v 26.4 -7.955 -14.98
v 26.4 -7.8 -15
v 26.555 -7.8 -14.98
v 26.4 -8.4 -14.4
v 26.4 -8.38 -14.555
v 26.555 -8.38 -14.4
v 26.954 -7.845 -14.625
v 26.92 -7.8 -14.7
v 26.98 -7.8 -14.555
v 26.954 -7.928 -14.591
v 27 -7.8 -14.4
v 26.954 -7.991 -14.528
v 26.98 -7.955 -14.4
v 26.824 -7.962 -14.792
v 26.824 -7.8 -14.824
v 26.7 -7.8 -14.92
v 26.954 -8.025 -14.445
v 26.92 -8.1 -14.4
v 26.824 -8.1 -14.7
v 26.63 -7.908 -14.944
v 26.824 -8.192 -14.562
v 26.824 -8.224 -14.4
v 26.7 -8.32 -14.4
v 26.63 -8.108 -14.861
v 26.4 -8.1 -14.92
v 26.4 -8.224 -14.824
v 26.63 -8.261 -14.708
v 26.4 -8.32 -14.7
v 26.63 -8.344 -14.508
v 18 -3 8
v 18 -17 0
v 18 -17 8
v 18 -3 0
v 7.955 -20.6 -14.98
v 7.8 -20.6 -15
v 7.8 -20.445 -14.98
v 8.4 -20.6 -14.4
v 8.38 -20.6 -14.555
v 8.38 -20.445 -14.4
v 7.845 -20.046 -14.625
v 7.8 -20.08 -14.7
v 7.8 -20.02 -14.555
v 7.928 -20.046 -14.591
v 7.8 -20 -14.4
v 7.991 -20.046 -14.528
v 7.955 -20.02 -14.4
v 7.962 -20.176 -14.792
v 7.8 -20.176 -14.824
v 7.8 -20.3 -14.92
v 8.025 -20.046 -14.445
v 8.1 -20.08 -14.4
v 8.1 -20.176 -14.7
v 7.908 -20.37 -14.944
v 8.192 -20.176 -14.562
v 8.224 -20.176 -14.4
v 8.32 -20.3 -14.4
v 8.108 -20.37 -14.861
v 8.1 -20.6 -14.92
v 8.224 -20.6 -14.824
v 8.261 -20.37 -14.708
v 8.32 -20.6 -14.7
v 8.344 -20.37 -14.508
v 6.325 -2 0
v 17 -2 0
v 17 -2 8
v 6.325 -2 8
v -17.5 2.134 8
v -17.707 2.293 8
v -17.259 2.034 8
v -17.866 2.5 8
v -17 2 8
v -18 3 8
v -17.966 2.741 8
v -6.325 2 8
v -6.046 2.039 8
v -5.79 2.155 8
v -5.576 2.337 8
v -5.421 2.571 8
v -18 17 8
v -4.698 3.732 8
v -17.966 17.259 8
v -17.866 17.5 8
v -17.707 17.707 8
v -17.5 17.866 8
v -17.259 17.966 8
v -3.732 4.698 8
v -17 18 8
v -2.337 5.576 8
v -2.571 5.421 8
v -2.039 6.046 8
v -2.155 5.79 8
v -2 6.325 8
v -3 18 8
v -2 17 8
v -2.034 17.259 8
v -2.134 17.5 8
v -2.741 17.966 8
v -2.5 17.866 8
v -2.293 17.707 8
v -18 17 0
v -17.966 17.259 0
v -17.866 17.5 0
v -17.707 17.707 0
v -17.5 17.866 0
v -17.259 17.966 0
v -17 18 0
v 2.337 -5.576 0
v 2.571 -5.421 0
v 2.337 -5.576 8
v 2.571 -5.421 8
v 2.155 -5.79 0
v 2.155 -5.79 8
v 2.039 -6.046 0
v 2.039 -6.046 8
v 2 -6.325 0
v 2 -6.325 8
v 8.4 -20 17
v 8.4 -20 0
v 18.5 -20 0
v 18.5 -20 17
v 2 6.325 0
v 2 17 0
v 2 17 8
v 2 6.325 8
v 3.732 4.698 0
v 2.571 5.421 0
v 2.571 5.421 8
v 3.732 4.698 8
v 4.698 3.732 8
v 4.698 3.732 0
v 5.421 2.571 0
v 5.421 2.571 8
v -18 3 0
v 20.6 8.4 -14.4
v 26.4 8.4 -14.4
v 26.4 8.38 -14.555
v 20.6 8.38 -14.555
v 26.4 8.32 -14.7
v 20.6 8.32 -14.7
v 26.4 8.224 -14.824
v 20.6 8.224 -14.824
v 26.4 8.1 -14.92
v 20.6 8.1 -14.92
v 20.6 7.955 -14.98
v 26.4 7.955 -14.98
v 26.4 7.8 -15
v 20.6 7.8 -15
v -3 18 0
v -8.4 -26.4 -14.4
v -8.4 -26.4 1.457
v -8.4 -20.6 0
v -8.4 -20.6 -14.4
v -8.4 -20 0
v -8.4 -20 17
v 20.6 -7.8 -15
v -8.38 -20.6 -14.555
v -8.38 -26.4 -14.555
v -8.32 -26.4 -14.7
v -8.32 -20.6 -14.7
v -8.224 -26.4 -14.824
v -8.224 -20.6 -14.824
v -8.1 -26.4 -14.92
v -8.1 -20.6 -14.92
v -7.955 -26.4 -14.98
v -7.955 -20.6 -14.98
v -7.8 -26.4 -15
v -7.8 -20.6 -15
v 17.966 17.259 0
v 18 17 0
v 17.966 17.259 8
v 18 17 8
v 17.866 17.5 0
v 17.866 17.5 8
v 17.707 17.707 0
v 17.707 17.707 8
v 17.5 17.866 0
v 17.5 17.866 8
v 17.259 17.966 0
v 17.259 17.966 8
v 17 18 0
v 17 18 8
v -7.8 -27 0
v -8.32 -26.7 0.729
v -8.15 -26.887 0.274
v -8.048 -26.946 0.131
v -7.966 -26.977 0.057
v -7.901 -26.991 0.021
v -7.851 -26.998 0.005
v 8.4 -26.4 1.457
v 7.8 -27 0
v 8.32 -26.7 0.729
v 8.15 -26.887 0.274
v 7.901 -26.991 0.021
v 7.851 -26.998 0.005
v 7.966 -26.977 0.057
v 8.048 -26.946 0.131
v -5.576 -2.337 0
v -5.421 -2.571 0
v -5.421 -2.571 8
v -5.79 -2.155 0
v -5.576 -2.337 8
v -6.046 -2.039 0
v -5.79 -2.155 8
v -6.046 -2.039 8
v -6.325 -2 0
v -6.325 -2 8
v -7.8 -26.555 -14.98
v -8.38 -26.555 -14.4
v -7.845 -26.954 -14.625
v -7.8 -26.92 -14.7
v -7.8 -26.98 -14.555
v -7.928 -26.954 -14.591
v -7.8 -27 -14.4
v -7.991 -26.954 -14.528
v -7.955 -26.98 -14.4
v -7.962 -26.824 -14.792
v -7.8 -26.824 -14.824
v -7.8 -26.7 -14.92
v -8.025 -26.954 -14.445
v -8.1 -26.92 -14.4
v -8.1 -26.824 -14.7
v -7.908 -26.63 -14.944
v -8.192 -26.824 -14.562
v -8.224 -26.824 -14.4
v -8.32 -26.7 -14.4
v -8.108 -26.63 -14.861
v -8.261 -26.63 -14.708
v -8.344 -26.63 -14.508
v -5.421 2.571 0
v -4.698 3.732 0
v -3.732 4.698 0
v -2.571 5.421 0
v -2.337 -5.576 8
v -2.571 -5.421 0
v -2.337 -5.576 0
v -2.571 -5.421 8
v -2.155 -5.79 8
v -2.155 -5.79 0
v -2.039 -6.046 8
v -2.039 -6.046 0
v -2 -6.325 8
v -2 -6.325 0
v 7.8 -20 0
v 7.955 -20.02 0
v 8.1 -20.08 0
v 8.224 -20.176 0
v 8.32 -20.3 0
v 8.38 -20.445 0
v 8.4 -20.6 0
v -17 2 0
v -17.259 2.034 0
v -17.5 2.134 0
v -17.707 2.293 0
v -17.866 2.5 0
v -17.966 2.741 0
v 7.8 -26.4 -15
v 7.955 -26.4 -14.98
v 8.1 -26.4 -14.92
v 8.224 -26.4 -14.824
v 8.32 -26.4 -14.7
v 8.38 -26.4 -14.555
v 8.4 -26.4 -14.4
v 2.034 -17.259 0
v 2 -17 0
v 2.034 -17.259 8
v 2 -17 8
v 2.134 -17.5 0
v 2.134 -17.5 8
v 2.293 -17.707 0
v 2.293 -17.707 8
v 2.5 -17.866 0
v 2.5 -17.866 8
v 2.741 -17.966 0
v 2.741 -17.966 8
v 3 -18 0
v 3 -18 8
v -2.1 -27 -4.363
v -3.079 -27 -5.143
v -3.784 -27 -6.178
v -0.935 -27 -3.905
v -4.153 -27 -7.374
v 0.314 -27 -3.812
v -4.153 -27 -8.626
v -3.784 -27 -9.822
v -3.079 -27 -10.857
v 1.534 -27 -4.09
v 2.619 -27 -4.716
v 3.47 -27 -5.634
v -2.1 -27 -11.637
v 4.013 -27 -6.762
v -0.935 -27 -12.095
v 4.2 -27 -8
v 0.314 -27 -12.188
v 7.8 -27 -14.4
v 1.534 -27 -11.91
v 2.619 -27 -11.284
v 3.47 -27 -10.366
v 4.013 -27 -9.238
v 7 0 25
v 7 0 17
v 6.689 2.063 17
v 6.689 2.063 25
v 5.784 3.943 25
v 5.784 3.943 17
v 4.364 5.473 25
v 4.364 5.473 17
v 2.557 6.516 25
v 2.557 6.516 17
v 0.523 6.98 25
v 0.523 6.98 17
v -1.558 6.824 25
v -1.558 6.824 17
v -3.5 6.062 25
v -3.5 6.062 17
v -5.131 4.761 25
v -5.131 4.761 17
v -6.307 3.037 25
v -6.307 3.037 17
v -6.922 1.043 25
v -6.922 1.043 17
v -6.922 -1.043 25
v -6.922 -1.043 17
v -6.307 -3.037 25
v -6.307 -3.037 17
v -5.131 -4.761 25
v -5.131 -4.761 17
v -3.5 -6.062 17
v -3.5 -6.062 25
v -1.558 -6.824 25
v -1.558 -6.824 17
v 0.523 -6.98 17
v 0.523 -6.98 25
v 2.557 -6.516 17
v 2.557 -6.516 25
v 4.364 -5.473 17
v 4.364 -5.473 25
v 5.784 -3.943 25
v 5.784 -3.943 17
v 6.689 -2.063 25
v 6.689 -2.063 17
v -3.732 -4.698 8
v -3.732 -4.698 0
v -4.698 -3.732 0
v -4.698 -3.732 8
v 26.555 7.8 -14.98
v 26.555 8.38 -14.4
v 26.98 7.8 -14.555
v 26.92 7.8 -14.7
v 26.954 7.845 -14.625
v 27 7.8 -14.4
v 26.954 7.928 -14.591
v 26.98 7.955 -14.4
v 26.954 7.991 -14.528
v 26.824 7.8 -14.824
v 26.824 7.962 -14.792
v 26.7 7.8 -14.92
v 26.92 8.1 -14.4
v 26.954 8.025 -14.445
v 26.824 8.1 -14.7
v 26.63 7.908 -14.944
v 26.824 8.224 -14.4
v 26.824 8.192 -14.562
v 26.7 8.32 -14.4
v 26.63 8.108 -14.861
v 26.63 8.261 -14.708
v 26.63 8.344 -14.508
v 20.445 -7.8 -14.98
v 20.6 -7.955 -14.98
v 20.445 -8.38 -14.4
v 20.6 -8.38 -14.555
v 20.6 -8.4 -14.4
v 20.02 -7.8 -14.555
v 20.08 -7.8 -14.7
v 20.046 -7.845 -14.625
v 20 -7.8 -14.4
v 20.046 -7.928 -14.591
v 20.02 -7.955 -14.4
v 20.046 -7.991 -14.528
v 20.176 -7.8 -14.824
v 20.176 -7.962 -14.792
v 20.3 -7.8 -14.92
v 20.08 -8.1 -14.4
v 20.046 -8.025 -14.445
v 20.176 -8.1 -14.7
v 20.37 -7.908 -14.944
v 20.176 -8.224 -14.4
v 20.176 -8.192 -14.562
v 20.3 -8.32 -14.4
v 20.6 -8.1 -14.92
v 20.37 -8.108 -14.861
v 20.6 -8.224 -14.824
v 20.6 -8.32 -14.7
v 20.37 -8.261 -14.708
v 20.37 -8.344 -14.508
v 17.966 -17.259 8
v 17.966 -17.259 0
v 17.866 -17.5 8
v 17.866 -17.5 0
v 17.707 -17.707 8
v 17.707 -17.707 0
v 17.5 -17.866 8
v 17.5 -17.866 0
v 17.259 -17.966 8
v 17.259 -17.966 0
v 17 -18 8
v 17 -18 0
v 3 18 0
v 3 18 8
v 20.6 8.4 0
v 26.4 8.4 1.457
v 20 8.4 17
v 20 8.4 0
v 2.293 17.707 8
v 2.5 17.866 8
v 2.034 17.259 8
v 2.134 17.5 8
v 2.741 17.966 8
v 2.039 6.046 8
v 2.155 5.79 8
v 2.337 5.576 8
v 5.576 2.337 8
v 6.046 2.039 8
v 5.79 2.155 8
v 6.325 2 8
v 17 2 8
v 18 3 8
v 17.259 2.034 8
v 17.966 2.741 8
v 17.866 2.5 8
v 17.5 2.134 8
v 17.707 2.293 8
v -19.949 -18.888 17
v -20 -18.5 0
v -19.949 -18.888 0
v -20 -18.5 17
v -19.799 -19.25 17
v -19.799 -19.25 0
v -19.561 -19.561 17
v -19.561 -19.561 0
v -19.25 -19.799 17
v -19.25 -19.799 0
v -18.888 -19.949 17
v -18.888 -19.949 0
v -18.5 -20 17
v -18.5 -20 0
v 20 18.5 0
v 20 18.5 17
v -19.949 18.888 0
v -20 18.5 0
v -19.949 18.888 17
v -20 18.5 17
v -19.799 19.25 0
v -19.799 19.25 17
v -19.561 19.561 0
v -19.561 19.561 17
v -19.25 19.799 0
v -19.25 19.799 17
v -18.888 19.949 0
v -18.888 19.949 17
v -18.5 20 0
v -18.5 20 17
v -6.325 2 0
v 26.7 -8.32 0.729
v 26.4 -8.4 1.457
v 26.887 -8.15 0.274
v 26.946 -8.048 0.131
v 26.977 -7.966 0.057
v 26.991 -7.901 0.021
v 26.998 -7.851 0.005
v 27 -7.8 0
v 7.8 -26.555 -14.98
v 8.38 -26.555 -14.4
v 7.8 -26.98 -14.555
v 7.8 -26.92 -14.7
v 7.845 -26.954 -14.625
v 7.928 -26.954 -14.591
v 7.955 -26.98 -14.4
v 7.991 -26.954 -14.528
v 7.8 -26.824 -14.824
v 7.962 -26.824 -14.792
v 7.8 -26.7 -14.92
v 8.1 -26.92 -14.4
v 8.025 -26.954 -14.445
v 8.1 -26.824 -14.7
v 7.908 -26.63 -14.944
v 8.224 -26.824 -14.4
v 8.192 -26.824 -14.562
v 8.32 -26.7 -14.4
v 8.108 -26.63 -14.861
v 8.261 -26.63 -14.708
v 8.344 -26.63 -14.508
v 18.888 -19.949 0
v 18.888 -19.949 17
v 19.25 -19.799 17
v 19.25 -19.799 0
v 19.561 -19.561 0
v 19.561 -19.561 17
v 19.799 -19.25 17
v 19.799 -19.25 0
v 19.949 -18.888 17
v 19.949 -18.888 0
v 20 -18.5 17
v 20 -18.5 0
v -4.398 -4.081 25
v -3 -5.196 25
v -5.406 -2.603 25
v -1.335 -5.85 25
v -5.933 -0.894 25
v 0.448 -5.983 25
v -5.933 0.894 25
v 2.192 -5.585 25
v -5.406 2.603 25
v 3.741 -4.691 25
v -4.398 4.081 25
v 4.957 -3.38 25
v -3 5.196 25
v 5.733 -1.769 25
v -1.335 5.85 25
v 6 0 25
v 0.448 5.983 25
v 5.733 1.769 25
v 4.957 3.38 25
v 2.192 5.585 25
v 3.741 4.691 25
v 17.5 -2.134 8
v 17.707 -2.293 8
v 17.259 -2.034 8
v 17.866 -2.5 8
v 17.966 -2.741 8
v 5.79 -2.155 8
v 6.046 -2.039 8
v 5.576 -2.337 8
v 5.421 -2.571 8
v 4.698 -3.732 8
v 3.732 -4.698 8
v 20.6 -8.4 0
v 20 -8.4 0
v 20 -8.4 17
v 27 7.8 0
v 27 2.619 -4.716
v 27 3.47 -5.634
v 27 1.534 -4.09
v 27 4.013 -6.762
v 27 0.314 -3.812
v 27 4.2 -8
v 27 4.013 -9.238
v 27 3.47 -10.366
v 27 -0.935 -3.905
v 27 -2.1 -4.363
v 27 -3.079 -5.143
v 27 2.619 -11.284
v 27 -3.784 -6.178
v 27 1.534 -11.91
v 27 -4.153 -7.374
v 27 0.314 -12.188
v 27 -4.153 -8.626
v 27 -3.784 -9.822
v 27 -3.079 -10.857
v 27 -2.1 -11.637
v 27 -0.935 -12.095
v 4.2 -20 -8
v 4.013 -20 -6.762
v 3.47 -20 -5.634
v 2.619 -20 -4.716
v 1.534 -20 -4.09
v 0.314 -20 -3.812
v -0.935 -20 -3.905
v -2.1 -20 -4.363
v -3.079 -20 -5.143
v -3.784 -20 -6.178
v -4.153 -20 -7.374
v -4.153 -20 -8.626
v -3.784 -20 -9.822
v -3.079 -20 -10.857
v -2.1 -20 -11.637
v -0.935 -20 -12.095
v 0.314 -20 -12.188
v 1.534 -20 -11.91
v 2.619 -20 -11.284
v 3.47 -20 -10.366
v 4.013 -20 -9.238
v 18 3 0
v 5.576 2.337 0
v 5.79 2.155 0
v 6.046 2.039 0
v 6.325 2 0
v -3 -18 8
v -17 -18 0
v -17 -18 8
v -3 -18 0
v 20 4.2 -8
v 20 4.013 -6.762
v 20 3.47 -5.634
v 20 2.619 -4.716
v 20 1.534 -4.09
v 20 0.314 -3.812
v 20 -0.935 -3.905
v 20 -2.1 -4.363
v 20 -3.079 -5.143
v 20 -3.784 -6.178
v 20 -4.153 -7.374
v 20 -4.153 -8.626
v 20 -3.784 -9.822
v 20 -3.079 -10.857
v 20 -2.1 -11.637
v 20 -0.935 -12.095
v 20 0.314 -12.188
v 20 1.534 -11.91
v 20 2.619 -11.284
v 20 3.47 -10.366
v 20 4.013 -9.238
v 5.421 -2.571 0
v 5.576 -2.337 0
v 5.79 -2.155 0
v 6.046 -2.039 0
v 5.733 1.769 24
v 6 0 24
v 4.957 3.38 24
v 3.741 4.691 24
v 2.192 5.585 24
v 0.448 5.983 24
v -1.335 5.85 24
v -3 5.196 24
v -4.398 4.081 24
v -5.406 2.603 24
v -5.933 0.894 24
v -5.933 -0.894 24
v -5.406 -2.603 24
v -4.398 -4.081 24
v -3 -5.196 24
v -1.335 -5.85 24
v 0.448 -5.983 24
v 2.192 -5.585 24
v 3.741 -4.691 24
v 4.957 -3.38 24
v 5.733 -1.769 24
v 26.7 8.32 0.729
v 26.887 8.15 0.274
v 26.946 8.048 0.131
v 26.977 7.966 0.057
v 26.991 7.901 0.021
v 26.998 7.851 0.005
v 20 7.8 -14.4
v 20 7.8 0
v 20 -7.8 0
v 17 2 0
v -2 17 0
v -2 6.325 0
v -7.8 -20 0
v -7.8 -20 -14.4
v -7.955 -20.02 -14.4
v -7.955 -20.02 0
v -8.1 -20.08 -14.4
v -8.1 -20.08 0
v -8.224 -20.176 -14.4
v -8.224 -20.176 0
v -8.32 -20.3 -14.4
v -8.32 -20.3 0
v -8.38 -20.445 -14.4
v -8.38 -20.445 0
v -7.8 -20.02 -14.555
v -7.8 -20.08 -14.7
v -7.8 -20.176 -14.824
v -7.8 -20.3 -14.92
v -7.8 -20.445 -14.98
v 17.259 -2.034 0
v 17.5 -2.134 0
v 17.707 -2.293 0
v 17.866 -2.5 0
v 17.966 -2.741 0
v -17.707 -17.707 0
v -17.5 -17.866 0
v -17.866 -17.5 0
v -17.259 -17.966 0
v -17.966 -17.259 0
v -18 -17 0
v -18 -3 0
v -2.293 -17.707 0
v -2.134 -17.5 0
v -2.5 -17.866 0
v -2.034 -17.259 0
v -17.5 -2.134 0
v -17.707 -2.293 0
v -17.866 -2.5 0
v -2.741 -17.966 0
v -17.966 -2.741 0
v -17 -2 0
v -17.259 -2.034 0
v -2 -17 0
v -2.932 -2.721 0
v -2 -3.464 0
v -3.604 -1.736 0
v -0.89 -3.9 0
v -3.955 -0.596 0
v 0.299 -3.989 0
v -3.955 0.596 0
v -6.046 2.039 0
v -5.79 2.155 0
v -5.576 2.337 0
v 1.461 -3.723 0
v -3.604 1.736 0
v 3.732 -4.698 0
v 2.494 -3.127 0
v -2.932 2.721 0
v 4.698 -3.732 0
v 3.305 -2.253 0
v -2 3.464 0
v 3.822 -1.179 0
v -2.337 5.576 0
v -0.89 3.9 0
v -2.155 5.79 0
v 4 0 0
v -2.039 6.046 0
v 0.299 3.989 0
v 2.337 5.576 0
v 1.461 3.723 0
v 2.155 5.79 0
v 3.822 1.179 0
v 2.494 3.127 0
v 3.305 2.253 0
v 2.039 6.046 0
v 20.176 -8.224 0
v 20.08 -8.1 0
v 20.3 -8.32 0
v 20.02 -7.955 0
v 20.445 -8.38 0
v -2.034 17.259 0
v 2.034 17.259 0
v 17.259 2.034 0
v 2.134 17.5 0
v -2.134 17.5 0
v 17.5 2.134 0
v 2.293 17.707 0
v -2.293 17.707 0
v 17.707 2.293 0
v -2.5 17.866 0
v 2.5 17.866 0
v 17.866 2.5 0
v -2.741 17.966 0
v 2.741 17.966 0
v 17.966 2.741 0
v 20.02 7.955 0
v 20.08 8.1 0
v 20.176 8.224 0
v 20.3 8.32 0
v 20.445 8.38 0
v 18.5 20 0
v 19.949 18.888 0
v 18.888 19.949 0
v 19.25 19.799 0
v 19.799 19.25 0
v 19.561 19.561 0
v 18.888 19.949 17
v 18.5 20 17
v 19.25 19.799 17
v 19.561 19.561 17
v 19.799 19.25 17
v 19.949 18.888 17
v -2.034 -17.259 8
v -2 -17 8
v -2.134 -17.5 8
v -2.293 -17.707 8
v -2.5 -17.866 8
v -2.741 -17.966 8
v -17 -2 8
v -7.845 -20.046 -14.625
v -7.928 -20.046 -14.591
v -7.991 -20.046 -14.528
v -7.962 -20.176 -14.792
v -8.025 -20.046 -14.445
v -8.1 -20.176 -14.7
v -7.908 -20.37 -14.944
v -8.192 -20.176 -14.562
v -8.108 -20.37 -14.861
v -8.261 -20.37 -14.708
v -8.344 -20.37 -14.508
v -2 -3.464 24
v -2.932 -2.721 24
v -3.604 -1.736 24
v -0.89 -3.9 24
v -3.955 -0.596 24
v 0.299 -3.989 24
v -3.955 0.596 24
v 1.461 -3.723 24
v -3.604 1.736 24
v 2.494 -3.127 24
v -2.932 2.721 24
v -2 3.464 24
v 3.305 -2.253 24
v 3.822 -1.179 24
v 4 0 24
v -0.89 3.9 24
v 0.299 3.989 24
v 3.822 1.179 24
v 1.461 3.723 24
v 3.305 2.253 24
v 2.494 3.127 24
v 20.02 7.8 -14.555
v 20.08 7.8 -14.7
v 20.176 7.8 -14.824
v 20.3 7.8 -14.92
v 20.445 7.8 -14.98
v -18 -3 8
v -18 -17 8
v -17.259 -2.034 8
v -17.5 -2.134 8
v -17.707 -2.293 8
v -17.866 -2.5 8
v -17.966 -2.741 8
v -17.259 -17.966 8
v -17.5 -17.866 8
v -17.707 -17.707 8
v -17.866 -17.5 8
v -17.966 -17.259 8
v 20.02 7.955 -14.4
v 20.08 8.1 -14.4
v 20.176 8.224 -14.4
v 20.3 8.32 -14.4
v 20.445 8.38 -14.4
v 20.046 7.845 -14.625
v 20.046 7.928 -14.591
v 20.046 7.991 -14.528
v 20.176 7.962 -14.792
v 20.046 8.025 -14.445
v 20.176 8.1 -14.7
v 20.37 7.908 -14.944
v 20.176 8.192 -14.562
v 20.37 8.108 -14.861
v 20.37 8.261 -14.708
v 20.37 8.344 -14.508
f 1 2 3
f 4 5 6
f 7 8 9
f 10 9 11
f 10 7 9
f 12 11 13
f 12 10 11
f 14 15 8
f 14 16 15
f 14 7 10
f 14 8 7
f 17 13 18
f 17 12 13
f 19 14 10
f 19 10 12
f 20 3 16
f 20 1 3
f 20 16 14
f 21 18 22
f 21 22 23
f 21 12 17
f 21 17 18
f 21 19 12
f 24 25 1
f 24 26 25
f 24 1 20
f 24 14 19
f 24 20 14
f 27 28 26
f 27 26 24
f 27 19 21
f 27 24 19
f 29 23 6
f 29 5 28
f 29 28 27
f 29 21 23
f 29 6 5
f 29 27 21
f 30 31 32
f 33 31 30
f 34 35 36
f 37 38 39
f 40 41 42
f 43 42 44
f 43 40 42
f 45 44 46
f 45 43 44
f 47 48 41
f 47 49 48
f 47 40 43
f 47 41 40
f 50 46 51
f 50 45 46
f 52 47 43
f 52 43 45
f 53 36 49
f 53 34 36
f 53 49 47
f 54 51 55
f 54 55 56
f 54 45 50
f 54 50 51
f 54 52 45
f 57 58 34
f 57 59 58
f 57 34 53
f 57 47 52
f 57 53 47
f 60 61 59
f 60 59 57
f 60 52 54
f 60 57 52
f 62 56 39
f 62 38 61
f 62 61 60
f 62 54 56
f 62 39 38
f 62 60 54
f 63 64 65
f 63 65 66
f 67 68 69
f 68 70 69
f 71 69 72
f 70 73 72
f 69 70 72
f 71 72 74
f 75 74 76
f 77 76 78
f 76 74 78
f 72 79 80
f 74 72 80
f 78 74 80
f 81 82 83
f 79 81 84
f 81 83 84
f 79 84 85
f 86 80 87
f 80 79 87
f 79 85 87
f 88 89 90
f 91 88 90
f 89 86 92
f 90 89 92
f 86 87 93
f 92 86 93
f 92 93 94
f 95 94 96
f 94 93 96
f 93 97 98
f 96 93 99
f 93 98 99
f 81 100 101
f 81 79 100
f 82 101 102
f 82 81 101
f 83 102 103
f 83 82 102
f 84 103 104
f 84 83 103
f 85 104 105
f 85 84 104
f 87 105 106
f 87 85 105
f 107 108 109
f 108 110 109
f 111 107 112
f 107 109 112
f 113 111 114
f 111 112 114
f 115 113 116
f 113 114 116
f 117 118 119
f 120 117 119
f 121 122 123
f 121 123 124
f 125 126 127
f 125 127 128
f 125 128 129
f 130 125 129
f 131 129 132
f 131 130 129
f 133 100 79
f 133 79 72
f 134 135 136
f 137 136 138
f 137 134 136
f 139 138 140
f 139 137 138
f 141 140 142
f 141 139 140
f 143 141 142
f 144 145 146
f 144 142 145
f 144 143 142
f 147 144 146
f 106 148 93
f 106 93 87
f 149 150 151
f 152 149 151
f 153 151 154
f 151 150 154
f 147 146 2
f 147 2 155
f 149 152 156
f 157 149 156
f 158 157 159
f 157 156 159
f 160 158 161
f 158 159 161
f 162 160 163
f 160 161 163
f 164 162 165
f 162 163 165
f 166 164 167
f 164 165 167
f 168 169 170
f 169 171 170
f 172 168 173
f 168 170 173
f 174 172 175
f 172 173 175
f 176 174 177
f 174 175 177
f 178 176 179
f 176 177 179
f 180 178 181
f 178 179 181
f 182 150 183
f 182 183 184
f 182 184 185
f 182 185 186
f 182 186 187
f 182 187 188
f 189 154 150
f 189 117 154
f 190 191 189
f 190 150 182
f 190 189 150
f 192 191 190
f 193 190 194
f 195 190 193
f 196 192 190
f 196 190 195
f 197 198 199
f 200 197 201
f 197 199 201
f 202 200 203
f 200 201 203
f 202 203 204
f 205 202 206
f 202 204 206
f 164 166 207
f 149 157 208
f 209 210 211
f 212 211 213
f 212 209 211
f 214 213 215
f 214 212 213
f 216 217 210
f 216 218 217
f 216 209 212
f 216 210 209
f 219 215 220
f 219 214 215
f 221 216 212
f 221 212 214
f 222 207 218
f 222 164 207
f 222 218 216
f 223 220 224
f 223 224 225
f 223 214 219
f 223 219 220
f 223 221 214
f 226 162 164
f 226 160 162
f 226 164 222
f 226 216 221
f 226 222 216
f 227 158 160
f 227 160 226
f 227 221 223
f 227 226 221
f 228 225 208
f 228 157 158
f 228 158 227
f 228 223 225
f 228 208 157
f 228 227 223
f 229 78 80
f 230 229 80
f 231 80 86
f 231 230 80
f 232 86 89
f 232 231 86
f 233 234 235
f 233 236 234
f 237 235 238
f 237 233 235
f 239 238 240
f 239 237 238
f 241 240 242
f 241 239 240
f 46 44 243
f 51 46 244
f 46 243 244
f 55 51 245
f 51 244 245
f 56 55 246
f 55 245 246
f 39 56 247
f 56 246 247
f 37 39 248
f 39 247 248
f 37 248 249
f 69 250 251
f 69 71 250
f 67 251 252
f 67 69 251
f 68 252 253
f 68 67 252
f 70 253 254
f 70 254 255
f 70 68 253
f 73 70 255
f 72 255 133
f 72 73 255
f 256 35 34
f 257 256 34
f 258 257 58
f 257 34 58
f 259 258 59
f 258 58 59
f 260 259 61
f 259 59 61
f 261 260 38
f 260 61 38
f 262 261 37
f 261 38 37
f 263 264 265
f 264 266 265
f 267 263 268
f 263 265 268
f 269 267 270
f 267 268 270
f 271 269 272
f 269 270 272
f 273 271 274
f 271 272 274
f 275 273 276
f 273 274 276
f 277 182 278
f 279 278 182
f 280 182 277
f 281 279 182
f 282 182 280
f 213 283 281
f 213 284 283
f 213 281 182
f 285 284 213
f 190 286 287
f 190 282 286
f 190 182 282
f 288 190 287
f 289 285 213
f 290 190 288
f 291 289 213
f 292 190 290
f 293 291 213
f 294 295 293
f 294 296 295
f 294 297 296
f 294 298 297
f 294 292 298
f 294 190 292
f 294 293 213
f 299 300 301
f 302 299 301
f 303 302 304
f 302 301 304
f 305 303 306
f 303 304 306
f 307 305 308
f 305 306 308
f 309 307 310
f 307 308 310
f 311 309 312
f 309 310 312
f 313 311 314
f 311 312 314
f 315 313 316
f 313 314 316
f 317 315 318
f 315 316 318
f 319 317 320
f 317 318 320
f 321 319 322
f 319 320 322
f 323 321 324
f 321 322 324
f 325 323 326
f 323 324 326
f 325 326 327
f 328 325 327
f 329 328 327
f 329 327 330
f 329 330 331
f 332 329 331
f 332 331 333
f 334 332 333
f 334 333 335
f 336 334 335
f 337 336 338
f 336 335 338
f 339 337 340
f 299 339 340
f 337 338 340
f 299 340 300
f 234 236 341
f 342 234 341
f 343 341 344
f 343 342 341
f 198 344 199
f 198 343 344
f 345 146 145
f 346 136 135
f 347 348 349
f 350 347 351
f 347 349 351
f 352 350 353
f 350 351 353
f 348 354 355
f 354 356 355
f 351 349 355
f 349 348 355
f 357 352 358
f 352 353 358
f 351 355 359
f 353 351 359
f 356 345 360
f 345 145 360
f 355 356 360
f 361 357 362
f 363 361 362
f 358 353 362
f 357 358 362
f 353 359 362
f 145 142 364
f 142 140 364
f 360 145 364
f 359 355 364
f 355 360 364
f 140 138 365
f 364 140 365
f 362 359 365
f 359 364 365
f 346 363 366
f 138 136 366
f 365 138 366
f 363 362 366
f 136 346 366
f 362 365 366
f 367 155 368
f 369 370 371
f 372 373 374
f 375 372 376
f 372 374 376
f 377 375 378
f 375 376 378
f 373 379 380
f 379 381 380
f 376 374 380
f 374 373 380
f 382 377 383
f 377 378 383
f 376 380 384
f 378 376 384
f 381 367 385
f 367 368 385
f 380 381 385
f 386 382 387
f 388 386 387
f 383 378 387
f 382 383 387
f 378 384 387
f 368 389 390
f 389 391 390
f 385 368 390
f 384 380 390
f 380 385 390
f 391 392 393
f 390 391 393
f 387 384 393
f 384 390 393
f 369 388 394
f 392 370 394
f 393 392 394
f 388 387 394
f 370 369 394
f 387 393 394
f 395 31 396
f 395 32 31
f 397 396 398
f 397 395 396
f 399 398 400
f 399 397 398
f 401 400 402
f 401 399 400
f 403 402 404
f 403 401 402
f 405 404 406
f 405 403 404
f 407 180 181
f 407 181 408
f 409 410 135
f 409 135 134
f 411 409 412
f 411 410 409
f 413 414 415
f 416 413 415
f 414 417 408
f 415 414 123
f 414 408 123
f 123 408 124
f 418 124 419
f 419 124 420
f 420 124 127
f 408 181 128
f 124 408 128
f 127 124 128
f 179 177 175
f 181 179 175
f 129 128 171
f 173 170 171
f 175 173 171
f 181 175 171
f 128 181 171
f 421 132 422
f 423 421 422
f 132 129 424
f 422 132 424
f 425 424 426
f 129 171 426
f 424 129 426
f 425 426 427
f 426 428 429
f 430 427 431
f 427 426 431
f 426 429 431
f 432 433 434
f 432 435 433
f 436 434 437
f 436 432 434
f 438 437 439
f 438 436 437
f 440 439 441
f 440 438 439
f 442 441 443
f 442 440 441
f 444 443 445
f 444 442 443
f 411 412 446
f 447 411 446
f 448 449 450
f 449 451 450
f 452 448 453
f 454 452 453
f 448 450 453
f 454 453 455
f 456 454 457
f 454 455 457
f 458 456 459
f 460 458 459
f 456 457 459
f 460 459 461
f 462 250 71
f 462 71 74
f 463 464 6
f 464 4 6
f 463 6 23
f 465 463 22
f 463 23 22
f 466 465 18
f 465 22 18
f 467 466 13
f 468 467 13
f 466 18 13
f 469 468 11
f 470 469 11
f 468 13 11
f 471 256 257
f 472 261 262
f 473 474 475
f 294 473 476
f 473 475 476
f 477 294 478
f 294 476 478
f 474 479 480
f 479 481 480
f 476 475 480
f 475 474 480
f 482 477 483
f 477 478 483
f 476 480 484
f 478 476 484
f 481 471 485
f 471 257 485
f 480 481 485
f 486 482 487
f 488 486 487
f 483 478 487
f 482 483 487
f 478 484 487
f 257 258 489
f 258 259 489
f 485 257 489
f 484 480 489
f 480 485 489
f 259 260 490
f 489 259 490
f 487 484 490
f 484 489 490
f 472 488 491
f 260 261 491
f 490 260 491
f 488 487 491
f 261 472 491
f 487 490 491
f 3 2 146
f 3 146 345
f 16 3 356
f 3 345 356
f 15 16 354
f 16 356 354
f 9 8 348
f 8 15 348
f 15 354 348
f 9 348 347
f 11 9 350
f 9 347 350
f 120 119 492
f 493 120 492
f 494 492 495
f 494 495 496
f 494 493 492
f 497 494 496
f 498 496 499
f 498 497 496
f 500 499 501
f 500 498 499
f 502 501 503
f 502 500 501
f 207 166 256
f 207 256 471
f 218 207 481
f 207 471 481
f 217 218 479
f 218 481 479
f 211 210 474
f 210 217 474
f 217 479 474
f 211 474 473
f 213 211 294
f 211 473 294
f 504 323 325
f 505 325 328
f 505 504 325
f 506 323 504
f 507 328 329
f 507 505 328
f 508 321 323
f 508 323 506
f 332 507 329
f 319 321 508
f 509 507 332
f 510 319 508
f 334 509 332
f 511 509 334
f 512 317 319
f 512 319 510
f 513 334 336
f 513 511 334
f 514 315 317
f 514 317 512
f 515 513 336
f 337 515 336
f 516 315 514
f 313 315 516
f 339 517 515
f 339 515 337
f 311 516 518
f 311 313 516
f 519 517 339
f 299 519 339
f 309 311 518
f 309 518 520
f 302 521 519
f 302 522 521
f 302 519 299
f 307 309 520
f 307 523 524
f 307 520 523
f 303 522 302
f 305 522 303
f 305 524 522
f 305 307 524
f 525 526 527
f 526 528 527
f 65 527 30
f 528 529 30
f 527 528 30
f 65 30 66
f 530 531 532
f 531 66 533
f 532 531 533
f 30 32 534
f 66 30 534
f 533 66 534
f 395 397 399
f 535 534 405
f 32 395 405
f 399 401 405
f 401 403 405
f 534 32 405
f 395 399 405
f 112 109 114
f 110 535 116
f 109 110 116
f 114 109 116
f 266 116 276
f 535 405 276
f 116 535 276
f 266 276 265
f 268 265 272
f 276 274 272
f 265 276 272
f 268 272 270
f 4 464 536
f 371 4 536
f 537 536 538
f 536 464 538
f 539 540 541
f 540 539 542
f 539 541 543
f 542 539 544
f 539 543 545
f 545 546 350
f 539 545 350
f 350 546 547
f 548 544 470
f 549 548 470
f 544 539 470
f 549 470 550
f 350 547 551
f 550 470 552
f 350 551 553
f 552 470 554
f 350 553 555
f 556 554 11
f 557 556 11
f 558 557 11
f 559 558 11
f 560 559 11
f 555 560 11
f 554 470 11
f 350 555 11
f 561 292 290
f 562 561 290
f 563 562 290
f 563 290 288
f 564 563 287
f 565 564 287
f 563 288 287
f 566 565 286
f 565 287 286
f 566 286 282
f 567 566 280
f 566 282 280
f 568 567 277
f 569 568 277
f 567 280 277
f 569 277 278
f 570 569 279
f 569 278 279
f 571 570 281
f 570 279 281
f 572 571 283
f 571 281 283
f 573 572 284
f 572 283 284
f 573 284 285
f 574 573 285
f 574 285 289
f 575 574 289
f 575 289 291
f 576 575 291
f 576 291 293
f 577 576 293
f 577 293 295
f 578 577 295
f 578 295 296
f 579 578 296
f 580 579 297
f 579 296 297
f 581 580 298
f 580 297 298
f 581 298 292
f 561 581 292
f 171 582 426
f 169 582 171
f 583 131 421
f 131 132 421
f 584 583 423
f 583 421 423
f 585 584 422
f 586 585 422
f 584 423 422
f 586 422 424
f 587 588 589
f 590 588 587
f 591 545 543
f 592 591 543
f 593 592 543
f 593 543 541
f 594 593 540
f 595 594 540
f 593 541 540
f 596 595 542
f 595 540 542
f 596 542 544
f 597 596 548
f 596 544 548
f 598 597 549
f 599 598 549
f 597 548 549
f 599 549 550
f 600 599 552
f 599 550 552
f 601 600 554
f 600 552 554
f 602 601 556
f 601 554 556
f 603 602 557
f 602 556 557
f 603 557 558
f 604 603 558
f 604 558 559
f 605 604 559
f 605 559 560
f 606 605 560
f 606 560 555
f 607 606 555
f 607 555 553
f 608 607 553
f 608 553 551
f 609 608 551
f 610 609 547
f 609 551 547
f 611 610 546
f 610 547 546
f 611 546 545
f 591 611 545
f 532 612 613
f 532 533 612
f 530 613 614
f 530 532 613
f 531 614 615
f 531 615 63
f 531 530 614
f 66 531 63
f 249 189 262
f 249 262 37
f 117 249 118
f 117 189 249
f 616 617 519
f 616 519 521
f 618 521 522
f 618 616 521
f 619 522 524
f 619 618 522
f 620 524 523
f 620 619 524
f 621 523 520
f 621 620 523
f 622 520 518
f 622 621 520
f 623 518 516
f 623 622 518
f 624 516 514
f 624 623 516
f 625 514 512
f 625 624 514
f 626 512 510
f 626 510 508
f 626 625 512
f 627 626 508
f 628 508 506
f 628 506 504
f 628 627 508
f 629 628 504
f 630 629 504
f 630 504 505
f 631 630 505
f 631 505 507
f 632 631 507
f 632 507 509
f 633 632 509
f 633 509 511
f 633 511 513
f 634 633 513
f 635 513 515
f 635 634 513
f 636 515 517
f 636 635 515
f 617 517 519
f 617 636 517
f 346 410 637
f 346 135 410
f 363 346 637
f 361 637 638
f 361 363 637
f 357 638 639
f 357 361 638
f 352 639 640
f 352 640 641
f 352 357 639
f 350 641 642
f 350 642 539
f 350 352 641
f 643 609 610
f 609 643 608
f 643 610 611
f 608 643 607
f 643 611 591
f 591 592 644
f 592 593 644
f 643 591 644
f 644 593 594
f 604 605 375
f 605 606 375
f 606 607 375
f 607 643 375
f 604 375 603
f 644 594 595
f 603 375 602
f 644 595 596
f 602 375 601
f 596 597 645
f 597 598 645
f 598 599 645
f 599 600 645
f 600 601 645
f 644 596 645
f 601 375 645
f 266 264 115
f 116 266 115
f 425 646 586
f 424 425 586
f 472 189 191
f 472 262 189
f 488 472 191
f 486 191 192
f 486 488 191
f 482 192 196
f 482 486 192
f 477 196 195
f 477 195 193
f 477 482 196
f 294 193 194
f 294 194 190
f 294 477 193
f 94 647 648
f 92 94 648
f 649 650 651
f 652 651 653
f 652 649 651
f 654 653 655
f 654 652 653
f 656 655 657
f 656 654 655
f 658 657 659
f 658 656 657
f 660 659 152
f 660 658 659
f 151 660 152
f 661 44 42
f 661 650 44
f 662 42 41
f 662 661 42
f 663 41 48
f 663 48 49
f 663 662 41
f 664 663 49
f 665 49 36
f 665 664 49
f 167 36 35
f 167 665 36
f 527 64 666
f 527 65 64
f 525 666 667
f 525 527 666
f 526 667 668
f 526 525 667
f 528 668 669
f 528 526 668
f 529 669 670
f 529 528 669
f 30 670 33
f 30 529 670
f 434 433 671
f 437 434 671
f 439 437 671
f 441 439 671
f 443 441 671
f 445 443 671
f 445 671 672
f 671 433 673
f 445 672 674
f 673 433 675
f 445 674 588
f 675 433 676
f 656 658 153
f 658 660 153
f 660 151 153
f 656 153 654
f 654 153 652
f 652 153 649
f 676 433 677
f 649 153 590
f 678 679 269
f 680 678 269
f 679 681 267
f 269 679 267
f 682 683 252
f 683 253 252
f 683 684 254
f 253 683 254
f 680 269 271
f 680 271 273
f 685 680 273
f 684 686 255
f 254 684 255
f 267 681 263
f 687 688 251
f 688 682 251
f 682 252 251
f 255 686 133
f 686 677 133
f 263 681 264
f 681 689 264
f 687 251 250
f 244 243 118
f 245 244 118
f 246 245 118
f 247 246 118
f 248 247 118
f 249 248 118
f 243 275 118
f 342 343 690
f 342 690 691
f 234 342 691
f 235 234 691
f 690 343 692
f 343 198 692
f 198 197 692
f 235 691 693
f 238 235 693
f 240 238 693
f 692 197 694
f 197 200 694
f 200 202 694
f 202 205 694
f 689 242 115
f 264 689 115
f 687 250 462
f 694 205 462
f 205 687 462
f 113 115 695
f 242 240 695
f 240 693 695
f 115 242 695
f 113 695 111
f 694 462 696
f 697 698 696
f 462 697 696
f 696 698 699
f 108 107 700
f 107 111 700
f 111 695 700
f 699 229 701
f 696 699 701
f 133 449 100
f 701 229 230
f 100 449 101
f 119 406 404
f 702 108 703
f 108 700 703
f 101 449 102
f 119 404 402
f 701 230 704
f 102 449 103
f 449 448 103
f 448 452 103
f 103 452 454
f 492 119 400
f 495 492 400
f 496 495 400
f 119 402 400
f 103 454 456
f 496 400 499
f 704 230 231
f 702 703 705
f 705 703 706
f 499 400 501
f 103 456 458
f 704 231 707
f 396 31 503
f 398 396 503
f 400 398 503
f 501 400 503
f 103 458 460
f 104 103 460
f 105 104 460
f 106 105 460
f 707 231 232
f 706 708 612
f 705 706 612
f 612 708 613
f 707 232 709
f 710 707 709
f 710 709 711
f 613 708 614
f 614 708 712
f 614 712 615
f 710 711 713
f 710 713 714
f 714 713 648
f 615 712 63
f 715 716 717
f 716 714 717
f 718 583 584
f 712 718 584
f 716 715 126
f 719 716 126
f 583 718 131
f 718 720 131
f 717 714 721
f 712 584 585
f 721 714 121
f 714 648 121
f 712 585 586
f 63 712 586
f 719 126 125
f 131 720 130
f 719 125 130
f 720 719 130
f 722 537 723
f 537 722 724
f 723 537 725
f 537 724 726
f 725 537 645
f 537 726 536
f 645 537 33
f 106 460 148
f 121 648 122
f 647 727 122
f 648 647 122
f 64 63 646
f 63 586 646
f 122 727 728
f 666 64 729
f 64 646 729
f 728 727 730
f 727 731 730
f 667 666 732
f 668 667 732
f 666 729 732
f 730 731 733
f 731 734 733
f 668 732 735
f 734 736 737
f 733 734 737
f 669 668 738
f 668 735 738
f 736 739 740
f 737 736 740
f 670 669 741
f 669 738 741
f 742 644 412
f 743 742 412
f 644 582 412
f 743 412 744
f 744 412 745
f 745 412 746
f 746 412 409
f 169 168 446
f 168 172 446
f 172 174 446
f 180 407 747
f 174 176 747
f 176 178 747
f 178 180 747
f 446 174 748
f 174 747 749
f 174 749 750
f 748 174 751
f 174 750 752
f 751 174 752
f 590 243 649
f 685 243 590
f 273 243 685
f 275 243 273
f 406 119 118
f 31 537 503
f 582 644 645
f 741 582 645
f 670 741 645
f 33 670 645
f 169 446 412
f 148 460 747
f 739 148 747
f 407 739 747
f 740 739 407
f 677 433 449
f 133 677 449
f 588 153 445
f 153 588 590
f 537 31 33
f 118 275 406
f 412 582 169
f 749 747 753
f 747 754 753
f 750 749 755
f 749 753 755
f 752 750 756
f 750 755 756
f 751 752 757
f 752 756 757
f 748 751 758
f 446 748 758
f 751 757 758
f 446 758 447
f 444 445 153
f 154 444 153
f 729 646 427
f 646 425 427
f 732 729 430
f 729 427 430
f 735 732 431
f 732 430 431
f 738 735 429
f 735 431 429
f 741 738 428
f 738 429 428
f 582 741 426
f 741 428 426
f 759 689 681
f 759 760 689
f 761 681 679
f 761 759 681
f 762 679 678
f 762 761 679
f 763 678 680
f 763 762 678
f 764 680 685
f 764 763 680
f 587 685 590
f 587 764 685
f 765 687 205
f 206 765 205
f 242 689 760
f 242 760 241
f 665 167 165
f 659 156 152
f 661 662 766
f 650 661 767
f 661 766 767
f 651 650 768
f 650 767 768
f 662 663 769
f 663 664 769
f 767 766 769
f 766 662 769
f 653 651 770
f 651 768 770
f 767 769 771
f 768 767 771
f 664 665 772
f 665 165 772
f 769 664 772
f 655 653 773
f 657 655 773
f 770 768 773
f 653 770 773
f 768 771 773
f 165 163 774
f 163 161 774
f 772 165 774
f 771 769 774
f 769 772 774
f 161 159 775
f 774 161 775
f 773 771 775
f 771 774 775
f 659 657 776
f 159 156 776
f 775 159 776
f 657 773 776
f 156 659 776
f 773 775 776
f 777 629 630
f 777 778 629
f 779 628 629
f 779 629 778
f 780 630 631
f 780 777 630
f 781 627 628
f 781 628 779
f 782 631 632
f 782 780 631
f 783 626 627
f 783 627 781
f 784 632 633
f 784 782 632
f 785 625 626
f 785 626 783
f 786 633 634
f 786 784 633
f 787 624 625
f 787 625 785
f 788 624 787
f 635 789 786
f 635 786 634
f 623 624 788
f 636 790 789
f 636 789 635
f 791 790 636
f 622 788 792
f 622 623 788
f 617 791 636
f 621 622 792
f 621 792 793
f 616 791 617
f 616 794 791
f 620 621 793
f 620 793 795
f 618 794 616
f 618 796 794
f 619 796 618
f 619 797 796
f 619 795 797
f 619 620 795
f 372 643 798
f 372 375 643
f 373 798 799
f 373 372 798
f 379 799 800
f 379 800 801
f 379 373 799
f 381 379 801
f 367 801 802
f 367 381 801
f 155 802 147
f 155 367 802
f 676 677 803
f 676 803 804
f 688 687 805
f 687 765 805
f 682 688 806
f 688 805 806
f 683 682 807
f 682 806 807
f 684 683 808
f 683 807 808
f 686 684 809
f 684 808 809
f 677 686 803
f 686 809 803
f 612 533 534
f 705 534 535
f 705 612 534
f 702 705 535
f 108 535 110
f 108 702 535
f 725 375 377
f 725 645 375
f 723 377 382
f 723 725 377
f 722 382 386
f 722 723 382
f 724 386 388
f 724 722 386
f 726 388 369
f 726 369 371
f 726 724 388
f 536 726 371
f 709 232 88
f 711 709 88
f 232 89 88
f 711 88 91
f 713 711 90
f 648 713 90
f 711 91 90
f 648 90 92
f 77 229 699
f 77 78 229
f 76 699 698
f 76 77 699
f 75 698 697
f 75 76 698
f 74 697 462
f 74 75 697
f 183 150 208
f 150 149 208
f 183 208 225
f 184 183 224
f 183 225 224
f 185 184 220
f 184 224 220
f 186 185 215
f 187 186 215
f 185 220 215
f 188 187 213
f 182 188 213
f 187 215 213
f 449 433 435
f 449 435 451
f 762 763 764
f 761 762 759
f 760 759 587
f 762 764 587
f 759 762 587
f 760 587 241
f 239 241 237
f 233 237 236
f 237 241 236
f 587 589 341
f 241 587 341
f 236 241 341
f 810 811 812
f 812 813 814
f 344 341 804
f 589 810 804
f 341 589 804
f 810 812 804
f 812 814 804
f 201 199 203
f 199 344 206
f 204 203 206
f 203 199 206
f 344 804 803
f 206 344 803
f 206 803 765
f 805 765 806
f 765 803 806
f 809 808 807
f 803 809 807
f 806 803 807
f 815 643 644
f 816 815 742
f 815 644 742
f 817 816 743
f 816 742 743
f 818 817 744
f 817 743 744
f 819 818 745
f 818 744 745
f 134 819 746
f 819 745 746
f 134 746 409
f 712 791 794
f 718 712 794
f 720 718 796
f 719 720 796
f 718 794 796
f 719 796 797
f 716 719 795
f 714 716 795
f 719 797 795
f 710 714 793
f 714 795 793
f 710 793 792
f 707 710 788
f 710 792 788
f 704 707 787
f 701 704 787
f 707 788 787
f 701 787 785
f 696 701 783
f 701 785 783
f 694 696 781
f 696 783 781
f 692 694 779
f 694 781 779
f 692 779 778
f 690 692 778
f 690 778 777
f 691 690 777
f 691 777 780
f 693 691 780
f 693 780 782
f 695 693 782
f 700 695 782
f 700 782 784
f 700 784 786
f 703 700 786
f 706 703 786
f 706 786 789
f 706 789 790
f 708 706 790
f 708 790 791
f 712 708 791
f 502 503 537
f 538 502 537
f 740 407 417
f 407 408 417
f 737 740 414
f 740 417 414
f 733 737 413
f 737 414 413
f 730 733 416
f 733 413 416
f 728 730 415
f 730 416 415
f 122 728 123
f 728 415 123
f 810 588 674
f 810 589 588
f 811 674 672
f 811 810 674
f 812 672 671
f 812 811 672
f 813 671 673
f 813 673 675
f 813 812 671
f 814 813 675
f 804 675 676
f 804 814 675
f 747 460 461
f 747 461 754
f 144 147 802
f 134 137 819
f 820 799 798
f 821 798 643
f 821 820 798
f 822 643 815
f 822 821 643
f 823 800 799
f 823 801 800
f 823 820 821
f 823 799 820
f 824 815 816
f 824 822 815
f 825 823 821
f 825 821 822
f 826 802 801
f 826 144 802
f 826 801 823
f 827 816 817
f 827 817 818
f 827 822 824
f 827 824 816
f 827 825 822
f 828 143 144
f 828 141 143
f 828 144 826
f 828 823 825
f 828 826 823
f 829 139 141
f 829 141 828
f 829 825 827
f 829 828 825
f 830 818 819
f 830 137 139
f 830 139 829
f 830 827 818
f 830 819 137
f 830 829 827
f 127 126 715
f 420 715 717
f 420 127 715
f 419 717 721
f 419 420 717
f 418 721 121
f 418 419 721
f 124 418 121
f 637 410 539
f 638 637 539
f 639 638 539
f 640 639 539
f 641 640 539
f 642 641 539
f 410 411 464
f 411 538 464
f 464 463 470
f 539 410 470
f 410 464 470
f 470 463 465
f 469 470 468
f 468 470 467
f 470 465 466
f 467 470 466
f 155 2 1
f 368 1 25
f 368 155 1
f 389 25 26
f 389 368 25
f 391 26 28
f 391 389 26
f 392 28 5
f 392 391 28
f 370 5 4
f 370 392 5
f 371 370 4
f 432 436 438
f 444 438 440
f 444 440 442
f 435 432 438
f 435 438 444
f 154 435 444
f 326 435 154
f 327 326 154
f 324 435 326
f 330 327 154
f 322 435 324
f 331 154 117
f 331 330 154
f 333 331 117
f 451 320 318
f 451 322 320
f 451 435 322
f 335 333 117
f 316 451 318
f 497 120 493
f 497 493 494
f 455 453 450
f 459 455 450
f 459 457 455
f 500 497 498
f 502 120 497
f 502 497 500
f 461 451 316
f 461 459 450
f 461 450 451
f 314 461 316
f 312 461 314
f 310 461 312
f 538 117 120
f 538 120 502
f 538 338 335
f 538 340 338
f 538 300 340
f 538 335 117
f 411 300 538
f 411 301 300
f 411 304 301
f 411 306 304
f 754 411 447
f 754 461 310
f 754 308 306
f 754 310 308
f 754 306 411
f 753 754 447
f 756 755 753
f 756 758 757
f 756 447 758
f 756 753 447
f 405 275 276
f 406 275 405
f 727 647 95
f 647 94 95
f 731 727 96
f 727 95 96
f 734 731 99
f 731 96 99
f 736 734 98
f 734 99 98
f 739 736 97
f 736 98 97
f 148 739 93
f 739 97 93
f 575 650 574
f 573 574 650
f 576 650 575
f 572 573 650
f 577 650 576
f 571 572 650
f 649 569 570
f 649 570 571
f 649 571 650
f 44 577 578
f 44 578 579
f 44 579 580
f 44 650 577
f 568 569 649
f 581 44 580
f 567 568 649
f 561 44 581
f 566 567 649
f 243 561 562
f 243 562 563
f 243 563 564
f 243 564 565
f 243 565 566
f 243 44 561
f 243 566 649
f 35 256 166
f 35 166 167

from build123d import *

# Parameters (mm, degrees)
SKETCH_W           = 40
SKETCH_H           = 40
PAD_DEPTH          = 17
SKETCH001_R        = 7
PAD001_DEPTH       = 8
SKETCH002_R        = 4
POCKET_DEPTH       = 25
CYLINDER_R         = 6
CYLINDER_DEPTH     = 1
PAD002_DEPTH       = 8.4
SKETCH004_R        = 4.2
POCKET001_DEPTH    = 7
PAD003_DEPTH       = 8.4
SKETCH006_R        = 4.2
POCKET002_DEPTH    = 7
POCKET003_DEPTH    = 8
POLARPATTERN_COUNT = 4
FILLET_R           = 1
FILLET001_R        = 1.5
FILLET002_R        = 0.6


with BuildPart() as part:
    # Sketch → Pad (new body)
    with BuildSketch(Plane.XY):
        Rectangle(SKETCH_W, SKETCH_H)
    extrude(amount=PAD_DEPTH)

    # Sketch001 (on Face6 of Pad) → Pad001 (join)
    with BuildSketch(Plane.XY.offset(17)):
        Circle(SKETCH001_R)
    extrude(amount=PAD001_DEPTH)

    # Sketch002 (on Face8 of Pad001) → Pocket (cut)
    with BuildSketch(Plane.XY.offset(25)):
        Circle(SKETCH002_R)
    extrude(amount=-POCKET_DEPTH, mode=Mode.SUBTRACT)

    # Cylinder → Cylinder (cut)
    with BuildSketch(Plane.XY.offset(24)):
        Circle(CYLINDER_R)
    extrude(amount=CYLINDER_DEPTH, mode=Mode.SUBTRACT)

    # Sketch003 → Pad002 (join, symmetric)
    with BuildSketch(Plane.XZ):
        Polygon((20, 17), (27, 0), (27, -15), (20, -15), align=None)
    extrude(amount=PAD002_DEPTH, both=True)

    # Sketch004 (on Face16 of Pad002) → Pocket001 (cut)
    with BuildSketch(Plane(origin=(27, 0, 24), x_dir=(0, 1, 0), z_dir=(1, 0, 0))):
        with Locations((0, -32)):
            Circle(SKETCH004_R)
    extrude(amount=-POCKET001_DEPTH, mode=Mode.SUBTRACT)

    # Sketch005 → Pad003 (join, symmetric)
    with BuildSketch(Plane.YZ):
        Polygon((-20, 17), (-27, 0), (-27, -15), (-20, -15), align=None)
    extrude(amount=PAD003_DEPTH, both=True)

    # Sketch006 (on Face17 of Pad003) → Pocket002 (cut)
    with BuildSketch(Plane(origin=(0, -27, 24), x_dir=(1, 0, 0), z_dir=(0, -1, 0))):
        with Locations((0, -32)):
            Circle(SKETCH006_R)
    extrude(amount=-POCKET002_DEPTH, mode=Mode.SUBTRACT)

    # Sketch007 (on Face4 of Pocket002) → Pocket003 (cut)
    with BuildSketch(Plane(origin=(0, 0, 0), x_dir=(1, 0, 0), z_dir=(0, 0, -1))):
        with BuildLine():
            ThreePointArc((5.656854, 2), (4.242641, 4.242641), (2, 5.656854))
            Line((2, 18), (2, 5.656854))
            Line((2, 18), (18, 18))
            Line((18, 18), (18, 2))
            Line((18, 2), (5.656854, 2))
        make_face()
    pocket003 = extrude(amount=-POCKET003_DEPTH, mode=Mode.SUBTRACT)

    # PolarPattern: Pocket003 ×4 about axis
    polarpattern_axis = Axis((0, 0, 0), (0, 0, -1))
    for i in range(1, POLARPATTERN_COUNT):
        add(pocket003.rotate(polarpattern_axis, i * 360 / POLARPATTERN_COUNT), mode=Mode.SUBTRACT)

    # Fillet
    fillet_edges = [part.edges().sort_by_distance(p)[0] for p in [
        (5.656854, -2, 4),
        (2, -5.656854, 4),
        (2, -18, 4),
        (18, -18, 4),
        (18, -2, 4),
        (5.656854, 2, 4),
        (18, 2, 4),
        (18, 18, 4),
        (2, 18, 4),
        (2, 5.656854, 4),
        (-2, 5.656854, 4),
        (-18, 2, 4),
        (-18, 18, 4),
        (-2, 18, 4),
        (-5.656854, 2, 4),
        (-5.656854, -2, 4),
        (-2, -5.656854, 4),
        (-2, -18, 4),
        (-18, -18, 4),
        (-18, -2, 4),
    ]]
    fillet(fillet_edges, radius=FILLET_R)

    # Fillet001
    fillet001_edges = [part.edges().sort_by_distance(p)[0] for p in [
        (20, 20, 8.5),
        (-20, 20, 8.5),
        (-20, -20, 8.5),
        (20, -20, 8.5),
    ]]
    fillet(fillet001_edges, radius=FILLET001_R)

    # Fillet002
    fillet002_edges = [part.edges().sort_by_distance(p)[0] for p in [
        (23.5, -8.4, -15),
        (23.5, 8.4, -15),
        (8.4, -23.5, -15),
        (-8.4, -23.5, -15),
        (0, -27, -15),
        (0, -20, -15),
        (27, 0, -15),
        (20, 0, -15),
        (27, -8.4, -7.5),
        (20, -8.4, -7.5),
        (27, 8.4, -7.5),
        (20, 8.4, -7.5),
        (8.4, -20, -7.5),
        (8.4, -27, -7.5),
        (-8.4, -20, -7.5),
        (-8.4, -27, -7.5),
    ]]
    fillet(fillet002_edges, radius=FILLET002_R)


solid = part.part
